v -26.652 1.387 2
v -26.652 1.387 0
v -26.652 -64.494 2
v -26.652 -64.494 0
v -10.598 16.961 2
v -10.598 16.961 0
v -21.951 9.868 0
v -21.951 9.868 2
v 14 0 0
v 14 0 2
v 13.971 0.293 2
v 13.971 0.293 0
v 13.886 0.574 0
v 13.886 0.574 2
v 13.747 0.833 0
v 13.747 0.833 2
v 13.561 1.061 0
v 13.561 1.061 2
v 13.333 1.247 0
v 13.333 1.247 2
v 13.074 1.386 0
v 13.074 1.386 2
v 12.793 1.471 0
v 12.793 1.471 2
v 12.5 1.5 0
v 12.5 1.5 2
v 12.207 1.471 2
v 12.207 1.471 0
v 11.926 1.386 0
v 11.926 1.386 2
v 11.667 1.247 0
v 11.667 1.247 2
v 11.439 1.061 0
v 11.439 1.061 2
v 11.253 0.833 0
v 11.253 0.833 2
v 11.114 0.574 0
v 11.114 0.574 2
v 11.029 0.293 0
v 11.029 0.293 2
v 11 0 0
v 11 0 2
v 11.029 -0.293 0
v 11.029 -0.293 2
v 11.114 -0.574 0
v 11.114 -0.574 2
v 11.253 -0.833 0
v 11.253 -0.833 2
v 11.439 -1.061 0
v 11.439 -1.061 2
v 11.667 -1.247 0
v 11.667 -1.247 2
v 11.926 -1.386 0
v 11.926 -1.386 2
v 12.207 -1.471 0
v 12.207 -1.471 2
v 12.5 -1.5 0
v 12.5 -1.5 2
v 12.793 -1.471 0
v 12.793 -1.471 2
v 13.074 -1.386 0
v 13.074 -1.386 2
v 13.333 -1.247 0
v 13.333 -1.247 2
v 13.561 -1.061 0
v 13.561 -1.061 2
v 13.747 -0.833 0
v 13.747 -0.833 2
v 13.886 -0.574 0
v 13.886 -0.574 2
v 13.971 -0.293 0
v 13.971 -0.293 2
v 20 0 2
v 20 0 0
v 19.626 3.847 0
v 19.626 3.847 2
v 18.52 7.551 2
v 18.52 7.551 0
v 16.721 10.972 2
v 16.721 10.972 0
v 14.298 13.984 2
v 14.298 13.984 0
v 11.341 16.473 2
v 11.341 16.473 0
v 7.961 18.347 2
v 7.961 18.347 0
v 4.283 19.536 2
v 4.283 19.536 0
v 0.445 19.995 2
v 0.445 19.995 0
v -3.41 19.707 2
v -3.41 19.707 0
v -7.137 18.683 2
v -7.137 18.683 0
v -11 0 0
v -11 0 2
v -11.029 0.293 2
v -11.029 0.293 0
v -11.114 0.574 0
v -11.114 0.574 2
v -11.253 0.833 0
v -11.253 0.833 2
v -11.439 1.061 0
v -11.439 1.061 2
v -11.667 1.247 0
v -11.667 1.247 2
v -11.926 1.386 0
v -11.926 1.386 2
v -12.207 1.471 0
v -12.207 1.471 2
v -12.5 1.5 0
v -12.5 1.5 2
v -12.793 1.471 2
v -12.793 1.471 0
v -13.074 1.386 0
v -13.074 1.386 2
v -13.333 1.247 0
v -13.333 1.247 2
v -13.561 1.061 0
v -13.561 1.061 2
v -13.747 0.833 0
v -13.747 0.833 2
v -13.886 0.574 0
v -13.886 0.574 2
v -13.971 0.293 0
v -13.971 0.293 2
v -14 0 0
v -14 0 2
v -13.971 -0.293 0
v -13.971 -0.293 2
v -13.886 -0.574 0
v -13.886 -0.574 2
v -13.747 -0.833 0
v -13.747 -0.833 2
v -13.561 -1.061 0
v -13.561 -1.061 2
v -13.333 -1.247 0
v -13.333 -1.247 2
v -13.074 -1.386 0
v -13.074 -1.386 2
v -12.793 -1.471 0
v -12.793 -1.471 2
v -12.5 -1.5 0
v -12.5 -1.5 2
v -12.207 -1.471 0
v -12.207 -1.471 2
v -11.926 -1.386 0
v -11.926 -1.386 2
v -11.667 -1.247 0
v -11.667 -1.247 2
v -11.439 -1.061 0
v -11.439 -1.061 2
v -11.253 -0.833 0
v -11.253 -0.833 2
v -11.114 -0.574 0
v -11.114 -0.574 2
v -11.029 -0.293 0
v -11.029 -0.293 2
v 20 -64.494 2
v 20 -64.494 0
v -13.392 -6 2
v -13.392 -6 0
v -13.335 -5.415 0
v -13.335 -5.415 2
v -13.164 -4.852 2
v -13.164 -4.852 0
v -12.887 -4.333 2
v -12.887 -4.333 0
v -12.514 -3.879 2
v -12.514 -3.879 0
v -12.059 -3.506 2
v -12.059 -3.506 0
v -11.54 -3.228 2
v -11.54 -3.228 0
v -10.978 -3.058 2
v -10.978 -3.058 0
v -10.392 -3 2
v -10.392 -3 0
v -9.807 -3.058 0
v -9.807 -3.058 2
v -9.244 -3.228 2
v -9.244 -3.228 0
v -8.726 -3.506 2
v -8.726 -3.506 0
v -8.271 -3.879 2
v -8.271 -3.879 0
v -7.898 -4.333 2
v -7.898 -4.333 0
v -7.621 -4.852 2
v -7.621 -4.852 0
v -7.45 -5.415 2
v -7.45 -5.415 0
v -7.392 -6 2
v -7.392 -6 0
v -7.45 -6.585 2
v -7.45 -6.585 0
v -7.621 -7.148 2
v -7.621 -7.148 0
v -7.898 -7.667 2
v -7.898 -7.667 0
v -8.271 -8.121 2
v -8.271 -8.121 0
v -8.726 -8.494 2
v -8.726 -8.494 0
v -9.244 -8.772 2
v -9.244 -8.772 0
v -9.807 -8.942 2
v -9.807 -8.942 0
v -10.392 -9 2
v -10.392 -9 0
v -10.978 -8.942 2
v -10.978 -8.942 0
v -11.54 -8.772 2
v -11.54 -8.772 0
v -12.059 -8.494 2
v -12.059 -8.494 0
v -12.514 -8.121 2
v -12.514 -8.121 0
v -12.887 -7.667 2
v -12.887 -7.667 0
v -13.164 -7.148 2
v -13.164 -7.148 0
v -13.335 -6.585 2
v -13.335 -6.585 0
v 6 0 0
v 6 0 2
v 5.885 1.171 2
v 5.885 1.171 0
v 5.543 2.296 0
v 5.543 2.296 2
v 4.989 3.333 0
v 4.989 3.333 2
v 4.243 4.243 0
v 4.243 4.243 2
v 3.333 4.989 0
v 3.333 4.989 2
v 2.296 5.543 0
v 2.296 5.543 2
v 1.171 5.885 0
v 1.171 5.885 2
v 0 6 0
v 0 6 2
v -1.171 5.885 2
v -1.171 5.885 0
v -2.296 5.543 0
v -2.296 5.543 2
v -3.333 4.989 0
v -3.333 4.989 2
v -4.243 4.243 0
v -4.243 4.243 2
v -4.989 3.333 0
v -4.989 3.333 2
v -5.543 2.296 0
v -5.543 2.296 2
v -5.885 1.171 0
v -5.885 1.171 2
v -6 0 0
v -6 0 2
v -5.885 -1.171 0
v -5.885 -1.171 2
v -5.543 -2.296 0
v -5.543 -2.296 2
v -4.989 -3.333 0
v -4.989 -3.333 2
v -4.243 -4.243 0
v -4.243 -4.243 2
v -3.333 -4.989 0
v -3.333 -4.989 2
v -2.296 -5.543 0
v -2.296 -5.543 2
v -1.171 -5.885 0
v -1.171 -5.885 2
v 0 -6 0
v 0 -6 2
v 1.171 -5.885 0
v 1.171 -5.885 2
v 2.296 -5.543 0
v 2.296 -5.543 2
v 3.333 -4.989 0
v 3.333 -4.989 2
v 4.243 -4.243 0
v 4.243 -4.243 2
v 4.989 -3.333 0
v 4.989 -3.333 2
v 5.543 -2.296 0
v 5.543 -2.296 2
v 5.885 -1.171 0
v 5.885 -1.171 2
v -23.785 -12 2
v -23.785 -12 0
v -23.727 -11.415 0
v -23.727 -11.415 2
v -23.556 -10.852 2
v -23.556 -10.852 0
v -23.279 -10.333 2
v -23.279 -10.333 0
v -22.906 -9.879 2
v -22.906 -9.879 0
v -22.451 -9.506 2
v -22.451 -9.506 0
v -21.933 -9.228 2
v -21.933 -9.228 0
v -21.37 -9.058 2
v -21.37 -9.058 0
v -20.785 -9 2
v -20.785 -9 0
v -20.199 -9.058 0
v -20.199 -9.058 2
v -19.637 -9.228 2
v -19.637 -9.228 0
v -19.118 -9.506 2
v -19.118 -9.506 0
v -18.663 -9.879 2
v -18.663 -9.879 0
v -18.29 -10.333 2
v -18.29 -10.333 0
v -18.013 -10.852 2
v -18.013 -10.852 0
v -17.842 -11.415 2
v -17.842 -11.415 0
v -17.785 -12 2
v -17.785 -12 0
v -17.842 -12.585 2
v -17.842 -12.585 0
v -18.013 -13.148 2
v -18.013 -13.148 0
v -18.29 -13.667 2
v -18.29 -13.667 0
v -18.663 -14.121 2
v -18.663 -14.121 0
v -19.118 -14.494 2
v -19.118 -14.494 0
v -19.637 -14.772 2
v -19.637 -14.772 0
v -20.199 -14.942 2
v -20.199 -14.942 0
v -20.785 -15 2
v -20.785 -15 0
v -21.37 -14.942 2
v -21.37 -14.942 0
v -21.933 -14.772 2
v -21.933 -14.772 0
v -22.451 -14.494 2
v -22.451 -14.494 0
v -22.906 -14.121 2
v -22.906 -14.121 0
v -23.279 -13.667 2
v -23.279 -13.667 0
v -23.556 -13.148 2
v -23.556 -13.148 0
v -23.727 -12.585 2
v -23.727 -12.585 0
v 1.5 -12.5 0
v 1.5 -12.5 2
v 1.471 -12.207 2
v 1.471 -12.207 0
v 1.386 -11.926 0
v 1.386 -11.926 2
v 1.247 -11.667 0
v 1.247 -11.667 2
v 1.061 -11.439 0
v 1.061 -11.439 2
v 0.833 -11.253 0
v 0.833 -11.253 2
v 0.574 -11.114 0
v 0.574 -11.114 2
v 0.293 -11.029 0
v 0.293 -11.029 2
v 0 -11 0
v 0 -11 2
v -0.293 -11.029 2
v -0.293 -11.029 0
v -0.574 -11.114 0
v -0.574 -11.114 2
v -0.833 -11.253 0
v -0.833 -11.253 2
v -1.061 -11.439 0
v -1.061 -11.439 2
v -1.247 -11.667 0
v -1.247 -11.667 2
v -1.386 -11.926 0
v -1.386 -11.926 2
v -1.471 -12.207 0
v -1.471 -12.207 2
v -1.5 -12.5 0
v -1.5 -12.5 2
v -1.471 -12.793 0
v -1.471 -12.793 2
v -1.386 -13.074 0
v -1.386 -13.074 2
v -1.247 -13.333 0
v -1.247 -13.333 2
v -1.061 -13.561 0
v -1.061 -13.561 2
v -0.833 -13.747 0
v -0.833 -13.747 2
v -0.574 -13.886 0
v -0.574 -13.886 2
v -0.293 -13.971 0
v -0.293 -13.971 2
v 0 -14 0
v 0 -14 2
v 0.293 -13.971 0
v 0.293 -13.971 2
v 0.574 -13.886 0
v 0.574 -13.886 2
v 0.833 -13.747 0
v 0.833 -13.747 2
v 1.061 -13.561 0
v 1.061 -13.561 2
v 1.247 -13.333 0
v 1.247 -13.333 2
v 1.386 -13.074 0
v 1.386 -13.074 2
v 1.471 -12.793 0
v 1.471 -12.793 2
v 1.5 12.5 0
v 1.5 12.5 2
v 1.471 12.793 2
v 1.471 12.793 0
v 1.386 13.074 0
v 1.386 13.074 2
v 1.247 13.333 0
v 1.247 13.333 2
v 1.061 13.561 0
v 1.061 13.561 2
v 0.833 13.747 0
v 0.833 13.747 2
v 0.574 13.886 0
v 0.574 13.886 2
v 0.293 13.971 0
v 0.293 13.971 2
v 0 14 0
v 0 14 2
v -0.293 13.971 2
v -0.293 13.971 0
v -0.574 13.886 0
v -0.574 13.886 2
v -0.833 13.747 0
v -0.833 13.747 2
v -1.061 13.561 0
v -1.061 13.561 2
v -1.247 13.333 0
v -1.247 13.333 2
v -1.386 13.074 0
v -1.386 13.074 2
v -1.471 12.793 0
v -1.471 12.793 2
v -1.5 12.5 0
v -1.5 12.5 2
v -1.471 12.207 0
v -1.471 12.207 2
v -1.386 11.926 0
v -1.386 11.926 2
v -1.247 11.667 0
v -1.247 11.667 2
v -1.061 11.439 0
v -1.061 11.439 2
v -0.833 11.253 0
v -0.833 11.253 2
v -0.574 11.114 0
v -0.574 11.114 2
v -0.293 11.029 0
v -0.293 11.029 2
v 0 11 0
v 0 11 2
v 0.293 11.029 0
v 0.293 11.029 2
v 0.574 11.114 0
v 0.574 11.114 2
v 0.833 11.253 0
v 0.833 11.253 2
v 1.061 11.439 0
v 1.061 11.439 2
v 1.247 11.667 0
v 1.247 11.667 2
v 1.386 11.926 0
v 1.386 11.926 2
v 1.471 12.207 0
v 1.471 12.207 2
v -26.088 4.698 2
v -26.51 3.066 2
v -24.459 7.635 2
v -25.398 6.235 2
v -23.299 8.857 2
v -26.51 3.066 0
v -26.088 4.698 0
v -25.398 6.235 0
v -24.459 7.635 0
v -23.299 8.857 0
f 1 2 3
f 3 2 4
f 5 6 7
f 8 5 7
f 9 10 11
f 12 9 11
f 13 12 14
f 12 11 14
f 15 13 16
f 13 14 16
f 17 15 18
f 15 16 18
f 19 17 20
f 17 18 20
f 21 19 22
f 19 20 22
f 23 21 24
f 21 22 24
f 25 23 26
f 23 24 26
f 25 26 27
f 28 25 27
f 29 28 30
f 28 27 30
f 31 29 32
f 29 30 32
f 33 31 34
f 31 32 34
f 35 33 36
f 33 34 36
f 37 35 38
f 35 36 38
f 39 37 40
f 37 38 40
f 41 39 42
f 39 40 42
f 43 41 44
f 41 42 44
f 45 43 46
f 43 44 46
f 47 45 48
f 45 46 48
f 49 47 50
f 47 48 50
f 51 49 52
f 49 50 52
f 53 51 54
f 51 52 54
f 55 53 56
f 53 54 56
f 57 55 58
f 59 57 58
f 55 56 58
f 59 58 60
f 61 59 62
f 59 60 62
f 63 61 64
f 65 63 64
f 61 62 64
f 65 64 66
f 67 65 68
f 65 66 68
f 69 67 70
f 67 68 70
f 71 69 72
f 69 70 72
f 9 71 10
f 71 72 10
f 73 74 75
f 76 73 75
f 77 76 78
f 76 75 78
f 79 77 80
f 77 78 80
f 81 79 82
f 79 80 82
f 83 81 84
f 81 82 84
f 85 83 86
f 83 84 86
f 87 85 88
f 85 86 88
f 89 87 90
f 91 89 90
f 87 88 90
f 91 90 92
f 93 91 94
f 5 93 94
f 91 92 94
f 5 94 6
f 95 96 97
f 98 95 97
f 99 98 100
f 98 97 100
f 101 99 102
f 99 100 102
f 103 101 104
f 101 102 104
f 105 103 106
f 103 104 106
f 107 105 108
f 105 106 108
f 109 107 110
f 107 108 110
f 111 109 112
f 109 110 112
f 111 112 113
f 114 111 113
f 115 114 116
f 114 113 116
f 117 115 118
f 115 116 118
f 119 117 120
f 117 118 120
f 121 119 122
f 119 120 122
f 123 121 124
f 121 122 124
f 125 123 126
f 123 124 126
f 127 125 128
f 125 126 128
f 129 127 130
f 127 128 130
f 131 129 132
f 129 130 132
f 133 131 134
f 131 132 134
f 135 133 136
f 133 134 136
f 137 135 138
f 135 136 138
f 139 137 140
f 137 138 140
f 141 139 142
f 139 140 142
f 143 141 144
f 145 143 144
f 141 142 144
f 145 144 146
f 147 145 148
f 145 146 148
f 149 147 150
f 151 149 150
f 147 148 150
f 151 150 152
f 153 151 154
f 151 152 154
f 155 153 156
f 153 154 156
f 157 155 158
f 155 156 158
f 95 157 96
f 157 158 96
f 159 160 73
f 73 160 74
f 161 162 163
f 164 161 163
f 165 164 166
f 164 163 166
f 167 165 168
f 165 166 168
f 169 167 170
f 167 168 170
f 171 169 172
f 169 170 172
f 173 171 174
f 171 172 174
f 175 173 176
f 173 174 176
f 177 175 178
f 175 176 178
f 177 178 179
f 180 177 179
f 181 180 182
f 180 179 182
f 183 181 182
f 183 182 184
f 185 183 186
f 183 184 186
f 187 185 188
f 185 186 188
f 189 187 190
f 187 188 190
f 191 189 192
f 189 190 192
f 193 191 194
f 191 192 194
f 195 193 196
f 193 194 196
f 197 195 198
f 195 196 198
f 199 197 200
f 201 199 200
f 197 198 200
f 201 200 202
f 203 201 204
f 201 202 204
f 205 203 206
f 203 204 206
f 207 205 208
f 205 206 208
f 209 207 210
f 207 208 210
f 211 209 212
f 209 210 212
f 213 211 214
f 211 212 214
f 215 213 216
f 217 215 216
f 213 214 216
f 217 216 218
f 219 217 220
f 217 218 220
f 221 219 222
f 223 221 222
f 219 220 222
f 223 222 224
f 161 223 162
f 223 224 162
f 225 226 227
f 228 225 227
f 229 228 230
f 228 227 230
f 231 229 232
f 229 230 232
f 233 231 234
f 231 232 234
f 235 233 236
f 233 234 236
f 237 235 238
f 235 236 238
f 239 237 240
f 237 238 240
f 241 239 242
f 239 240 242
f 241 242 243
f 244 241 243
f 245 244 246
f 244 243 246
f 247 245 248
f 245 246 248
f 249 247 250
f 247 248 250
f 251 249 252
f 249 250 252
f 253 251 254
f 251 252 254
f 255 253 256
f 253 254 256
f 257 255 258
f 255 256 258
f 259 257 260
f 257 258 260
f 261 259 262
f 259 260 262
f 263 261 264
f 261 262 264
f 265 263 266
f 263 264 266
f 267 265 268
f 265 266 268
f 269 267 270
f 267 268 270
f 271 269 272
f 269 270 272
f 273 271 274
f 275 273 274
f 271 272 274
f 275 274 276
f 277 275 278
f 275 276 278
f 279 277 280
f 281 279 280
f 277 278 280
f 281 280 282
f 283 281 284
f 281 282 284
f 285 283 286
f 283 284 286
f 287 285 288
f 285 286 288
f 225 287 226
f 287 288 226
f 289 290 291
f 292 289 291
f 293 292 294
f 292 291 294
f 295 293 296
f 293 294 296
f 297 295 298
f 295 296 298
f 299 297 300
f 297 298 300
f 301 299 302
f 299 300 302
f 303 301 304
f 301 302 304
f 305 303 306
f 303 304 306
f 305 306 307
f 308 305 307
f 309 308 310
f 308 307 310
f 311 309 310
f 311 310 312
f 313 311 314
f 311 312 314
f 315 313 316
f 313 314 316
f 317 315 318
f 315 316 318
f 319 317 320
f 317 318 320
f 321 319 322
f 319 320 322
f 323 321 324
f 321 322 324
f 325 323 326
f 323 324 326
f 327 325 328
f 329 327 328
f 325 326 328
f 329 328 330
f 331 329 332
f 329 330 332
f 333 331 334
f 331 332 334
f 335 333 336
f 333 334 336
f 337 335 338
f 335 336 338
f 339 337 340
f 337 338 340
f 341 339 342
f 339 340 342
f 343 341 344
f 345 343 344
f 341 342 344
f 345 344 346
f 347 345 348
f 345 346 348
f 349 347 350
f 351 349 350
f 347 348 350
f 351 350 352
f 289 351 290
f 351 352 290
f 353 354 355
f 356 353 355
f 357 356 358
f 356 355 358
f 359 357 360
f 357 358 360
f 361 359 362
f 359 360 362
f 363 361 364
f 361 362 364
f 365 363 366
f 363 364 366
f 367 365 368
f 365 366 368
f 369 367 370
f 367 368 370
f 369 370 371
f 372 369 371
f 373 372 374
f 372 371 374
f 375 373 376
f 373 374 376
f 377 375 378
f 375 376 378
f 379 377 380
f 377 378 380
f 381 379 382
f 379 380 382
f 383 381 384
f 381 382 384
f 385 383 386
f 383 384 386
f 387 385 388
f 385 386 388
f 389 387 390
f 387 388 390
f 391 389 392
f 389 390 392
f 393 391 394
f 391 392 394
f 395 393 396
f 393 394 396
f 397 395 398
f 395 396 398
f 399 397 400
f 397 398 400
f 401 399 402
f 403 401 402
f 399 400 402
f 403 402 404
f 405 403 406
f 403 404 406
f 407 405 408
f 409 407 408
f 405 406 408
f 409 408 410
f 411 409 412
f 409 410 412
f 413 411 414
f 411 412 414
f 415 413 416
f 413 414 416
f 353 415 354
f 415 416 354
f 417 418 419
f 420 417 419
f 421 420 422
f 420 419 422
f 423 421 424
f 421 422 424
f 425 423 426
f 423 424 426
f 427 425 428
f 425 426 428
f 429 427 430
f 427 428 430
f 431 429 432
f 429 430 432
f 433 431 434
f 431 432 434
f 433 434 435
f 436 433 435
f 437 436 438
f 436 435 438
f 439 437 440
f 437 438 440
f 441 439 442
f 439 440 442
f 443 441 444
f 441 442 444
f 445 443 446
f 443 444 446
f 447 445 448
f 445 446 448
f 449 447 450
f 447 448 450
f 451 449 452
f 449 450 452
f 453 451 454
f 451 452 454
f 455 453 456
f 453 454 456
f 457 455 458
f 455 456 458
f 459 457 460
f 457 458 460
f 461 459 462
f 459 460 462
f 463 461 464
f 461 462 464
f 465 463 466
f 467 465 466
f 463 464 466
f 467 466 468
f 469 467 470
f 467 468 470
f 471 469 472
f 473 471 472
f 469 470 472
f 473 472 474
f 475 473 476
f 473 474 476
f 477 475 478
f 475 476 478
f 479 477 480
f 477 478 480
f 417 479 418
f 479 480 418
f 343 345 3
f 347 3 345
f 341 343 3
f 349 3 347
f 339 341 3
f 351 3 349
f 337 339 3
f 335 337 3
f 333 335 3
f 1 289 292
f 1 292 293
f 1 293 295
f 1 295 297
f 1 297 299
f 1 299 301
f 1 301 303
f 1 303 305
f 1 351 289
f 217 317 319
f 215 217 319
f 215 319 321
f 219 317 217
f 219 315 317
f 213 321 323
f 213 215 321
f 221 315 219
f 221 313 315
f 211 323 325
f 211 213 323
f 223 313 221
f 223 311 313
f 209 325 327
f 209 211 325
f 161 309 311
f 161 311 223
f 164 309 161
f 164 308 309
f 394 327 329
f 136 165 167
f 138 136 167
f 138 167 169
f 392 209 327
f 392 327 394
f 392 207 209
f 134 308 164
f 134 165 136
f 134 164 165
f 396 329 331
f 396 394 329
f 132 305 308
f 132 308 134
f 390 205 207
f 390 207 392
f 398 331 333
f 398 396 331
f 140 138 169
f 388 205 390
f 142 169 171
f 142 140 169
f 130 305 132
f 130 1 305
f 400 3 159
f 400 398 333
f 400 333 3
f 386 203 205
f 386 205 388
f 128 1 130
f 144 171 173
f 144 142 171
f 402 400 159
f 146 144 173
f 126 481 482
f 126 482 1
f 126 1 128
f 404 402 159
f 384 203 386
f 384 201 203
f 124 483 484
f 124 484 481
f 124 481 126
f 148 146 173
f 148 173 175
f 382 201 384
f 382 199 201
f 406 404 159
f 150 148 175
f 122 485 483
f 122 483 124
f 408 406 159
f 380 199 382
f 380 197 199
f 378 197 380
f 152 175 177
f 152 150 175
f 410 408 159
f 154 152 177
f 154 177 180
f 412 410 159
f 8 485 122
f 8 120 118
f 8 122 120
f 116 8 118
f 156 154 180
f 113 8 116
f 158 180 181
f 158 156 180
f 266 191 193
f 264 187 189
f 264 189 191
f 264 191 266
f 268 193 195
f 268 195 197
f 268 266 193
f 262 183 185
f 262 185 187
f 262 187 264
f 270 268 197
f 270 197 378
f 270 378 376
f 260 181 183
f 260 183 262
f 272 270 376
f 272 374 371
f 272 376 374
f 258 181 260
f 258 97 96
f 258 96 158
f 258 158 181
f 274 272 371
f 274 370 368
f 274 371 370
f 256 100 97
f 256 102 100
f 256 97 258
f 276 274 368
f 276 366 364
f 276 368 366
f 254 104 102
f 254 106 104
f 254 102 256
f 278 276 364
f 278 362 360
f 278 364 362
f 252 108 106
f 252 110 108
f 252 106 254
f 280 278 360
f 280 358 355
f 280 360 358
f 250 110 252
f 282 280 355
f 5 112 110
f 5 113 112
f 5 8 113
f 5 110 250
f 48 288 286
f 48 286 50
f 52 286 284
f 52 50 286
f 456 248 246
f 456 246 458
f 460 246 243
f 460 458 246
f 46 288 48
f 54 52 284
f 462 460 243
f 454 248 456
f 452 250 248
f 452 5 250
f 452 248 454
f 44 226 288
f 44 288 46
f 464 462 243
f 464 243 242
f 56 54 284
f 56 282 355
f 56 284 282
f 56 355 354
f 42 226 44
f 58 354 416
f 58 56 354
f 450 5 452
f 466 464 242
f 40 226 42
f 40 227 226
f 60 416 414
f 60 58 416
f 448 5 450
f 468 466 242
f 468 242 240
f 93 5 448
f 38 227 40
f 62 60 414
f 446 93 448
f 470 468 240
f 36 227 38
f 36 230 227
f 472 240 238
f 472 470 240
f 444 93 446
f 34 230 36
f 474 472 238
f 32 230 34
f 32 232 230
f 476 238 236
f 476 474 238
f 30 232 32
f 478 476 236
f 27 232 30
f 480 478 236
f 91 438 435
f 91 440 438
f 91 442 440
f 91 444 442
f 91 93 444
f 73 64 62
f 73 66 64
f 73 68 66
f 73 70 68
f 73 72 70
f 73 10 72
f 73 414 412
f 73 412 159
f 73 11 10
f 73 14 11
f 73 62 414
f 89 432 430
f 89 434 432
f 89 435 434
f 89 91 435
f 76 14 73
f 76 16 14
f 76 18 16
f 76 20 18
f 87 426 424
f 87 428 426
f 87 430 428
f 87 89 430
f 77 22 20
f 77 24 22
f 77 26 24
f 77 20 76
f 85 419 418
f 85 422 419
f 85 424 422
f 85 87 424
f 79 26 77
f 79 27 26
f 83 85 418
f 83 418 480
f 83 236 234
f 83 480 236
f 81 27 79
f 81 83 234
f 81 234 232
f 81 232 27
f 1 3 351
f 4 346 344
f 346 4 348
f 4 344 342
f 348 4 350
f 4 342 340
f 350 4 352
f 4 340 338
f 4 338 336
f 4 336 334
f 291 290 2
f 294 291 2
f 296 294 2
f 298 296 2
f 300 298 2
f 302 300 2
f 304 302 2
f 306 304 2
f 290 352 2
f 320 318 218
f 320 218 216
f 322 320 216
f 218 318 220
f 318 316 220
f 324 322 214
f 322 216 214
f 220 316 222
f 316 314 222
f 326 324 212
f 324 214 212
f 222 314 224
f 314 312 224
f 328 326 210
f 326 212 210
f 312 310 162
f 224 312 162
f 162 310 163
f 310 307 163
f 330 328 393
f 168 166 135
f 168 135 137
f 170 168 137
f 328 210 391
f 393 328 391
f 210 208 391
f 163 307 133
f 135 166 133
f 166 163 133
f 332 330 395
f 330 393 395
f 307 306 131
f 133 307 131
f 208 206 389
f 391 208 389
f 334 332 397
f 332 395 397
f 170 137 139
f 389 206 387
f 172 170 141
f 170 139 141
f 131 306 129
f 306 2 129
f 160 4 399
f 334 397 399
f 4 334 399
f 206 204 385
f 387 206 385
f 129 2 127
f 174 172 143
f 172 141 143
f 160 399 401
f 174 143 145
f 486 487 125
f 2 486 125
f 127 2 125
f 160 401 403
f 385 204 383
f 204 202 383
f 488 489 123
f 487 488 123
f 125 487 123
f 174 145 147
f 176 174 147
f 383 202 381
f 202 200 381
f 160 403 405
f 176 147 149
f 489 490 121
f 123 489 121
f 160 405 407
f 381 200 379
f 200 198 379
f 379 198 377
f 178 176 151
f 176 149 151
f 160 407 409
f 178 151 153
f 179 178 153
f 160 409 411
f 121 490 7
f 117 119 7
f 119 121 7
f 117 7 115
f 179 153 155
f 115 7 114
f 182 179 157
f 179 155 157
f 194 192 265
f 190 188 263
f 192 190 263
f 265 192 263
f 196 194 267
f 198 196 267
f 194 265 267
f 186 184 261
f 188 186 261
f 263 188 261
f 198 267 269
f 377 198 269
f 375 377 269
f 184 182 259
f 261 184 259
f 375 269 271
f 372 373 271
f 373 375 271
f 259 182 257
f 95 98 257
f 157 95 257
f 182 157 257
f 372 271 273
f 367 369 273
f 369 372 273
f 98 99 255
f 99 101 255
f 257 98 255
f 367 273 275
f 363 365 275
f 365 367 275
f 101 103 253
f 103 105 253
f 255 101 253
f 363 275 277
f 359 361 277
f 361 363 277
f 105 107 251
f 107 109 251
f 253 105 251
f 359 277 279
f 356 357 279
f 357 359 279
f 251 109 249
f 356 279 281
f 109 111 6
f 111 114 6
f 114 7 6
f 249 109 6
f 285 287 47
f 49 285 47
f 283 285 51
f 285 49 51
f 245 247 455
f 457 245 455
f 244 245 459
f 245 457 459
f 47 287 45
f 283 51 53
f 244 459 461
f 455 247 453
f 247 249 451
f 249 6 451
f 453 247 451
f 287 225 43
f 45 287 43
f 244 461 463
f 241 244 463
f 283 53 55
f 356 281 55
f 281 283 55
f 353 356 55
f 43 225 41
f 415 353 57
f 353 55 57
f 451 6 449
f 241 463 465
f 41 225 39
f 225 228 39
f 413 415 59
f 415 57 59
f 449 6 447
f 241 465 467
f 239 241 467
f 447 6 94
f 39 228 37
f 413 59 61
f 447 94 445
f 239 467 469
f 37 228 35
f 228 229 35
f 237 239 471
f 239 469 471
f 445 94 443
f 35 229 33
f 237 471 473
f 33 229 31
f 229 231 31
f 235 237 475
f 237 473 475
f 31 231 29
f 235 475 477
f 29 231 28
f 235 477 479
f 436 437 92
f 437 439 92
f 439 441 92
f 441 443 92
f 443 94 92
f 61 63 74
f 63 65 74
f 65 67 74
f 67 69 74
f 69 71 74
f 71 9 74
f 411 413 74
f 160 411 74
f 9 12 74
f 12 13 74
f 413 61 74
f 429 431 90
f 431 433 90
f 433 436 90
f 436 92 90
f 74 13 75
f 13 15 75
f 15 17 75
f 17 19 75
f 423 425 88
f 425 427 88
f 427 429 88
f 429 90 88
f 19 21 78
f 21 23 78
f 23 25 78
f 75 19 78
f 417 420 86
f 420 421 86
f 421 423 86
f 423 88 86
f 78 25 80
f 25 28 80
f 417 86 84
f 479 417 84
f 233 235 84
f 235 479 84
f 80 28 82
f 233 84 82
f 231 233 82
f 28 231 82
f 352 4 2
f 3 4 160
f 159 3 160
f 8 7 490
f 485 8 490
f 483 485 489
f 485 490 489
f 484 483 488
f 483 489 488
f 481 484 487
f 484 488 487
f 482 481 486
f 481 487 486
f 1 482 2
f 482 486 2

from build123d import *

# Parameters (mm, degrees)
BOSS_EXTRUDE1_DEPTH = 2
SKETCH2_R           = 6
SKETCH2_R_2         = 1.5
CUT_EXTRUDE1_DEPTH  = 2
SKETCH3_R           = 3
CUT_EXTRUDE2_DEPTH  = 2


with BuildPart() as part:
    # Sketch1 → Boss-Extrude1 (new body)
    with BuildSketch(Plane.XY):
        with BuildLine():
            Line((-10.598037339, 16.961179339), (-21.950536445, 9.8676744))
            ThreePointArc((-21.950536445, 9.8676744), (-25.397665118, 6.235270644), (-26.651517775, 1.38708473))
            Line((-26.651517775, 1.38708473), (-26.651517775, -64.494263033))
            Line((-26.651517775, -64.494263033), (20, -64.494263033))
            Line((20, -64.494263033), (20, 0))
            ThreePointArc((20, 0), (9.696371827, 17.492294686), (-10.598037339, 16.961179339))
        make_face()
    extrude(amount=BOSS_EXTRUDE1_DEPTH)

    # Sketch2 → Cut-Extrude1 (cut)
    with BuildSketch(Plane.XY.offset(2)):
        Circle(SKETCH2_R)
        with Locations((12.5, 0)):
            Circle(SKETCH2_R_2)
        with Locations((0, -12.5)):
            Circle(SKETCH2_R_2)
        with Locations((-12.5, 0)):
            Circle(SKETCH2_R_2)
        with Locations((0, 12.5)):
            Circle(SKETCH2_R_2)
    extrude(amount=-CUT_EXTRUDE1_DEPTH, mode=Mode.SUBTRACT)

    # Sketch3 → Cut-Extrude2 (cut)
    with BuildSketch(Plane(origin=(0, 0, 0), x_dir=(-1, 0, 0), z_dir=(0, 0, -1))):
        with Locations((10.392304845, -6)):
            Circle(SKETCH3_R)
        with Locations((20.784609691, -12)):
            Circle(SKETCH3_R)
    extrude(amount=-CUT_EXTRUDE2_DEPTH, mode=Mode.SUBTRACT)


solid = part.part
